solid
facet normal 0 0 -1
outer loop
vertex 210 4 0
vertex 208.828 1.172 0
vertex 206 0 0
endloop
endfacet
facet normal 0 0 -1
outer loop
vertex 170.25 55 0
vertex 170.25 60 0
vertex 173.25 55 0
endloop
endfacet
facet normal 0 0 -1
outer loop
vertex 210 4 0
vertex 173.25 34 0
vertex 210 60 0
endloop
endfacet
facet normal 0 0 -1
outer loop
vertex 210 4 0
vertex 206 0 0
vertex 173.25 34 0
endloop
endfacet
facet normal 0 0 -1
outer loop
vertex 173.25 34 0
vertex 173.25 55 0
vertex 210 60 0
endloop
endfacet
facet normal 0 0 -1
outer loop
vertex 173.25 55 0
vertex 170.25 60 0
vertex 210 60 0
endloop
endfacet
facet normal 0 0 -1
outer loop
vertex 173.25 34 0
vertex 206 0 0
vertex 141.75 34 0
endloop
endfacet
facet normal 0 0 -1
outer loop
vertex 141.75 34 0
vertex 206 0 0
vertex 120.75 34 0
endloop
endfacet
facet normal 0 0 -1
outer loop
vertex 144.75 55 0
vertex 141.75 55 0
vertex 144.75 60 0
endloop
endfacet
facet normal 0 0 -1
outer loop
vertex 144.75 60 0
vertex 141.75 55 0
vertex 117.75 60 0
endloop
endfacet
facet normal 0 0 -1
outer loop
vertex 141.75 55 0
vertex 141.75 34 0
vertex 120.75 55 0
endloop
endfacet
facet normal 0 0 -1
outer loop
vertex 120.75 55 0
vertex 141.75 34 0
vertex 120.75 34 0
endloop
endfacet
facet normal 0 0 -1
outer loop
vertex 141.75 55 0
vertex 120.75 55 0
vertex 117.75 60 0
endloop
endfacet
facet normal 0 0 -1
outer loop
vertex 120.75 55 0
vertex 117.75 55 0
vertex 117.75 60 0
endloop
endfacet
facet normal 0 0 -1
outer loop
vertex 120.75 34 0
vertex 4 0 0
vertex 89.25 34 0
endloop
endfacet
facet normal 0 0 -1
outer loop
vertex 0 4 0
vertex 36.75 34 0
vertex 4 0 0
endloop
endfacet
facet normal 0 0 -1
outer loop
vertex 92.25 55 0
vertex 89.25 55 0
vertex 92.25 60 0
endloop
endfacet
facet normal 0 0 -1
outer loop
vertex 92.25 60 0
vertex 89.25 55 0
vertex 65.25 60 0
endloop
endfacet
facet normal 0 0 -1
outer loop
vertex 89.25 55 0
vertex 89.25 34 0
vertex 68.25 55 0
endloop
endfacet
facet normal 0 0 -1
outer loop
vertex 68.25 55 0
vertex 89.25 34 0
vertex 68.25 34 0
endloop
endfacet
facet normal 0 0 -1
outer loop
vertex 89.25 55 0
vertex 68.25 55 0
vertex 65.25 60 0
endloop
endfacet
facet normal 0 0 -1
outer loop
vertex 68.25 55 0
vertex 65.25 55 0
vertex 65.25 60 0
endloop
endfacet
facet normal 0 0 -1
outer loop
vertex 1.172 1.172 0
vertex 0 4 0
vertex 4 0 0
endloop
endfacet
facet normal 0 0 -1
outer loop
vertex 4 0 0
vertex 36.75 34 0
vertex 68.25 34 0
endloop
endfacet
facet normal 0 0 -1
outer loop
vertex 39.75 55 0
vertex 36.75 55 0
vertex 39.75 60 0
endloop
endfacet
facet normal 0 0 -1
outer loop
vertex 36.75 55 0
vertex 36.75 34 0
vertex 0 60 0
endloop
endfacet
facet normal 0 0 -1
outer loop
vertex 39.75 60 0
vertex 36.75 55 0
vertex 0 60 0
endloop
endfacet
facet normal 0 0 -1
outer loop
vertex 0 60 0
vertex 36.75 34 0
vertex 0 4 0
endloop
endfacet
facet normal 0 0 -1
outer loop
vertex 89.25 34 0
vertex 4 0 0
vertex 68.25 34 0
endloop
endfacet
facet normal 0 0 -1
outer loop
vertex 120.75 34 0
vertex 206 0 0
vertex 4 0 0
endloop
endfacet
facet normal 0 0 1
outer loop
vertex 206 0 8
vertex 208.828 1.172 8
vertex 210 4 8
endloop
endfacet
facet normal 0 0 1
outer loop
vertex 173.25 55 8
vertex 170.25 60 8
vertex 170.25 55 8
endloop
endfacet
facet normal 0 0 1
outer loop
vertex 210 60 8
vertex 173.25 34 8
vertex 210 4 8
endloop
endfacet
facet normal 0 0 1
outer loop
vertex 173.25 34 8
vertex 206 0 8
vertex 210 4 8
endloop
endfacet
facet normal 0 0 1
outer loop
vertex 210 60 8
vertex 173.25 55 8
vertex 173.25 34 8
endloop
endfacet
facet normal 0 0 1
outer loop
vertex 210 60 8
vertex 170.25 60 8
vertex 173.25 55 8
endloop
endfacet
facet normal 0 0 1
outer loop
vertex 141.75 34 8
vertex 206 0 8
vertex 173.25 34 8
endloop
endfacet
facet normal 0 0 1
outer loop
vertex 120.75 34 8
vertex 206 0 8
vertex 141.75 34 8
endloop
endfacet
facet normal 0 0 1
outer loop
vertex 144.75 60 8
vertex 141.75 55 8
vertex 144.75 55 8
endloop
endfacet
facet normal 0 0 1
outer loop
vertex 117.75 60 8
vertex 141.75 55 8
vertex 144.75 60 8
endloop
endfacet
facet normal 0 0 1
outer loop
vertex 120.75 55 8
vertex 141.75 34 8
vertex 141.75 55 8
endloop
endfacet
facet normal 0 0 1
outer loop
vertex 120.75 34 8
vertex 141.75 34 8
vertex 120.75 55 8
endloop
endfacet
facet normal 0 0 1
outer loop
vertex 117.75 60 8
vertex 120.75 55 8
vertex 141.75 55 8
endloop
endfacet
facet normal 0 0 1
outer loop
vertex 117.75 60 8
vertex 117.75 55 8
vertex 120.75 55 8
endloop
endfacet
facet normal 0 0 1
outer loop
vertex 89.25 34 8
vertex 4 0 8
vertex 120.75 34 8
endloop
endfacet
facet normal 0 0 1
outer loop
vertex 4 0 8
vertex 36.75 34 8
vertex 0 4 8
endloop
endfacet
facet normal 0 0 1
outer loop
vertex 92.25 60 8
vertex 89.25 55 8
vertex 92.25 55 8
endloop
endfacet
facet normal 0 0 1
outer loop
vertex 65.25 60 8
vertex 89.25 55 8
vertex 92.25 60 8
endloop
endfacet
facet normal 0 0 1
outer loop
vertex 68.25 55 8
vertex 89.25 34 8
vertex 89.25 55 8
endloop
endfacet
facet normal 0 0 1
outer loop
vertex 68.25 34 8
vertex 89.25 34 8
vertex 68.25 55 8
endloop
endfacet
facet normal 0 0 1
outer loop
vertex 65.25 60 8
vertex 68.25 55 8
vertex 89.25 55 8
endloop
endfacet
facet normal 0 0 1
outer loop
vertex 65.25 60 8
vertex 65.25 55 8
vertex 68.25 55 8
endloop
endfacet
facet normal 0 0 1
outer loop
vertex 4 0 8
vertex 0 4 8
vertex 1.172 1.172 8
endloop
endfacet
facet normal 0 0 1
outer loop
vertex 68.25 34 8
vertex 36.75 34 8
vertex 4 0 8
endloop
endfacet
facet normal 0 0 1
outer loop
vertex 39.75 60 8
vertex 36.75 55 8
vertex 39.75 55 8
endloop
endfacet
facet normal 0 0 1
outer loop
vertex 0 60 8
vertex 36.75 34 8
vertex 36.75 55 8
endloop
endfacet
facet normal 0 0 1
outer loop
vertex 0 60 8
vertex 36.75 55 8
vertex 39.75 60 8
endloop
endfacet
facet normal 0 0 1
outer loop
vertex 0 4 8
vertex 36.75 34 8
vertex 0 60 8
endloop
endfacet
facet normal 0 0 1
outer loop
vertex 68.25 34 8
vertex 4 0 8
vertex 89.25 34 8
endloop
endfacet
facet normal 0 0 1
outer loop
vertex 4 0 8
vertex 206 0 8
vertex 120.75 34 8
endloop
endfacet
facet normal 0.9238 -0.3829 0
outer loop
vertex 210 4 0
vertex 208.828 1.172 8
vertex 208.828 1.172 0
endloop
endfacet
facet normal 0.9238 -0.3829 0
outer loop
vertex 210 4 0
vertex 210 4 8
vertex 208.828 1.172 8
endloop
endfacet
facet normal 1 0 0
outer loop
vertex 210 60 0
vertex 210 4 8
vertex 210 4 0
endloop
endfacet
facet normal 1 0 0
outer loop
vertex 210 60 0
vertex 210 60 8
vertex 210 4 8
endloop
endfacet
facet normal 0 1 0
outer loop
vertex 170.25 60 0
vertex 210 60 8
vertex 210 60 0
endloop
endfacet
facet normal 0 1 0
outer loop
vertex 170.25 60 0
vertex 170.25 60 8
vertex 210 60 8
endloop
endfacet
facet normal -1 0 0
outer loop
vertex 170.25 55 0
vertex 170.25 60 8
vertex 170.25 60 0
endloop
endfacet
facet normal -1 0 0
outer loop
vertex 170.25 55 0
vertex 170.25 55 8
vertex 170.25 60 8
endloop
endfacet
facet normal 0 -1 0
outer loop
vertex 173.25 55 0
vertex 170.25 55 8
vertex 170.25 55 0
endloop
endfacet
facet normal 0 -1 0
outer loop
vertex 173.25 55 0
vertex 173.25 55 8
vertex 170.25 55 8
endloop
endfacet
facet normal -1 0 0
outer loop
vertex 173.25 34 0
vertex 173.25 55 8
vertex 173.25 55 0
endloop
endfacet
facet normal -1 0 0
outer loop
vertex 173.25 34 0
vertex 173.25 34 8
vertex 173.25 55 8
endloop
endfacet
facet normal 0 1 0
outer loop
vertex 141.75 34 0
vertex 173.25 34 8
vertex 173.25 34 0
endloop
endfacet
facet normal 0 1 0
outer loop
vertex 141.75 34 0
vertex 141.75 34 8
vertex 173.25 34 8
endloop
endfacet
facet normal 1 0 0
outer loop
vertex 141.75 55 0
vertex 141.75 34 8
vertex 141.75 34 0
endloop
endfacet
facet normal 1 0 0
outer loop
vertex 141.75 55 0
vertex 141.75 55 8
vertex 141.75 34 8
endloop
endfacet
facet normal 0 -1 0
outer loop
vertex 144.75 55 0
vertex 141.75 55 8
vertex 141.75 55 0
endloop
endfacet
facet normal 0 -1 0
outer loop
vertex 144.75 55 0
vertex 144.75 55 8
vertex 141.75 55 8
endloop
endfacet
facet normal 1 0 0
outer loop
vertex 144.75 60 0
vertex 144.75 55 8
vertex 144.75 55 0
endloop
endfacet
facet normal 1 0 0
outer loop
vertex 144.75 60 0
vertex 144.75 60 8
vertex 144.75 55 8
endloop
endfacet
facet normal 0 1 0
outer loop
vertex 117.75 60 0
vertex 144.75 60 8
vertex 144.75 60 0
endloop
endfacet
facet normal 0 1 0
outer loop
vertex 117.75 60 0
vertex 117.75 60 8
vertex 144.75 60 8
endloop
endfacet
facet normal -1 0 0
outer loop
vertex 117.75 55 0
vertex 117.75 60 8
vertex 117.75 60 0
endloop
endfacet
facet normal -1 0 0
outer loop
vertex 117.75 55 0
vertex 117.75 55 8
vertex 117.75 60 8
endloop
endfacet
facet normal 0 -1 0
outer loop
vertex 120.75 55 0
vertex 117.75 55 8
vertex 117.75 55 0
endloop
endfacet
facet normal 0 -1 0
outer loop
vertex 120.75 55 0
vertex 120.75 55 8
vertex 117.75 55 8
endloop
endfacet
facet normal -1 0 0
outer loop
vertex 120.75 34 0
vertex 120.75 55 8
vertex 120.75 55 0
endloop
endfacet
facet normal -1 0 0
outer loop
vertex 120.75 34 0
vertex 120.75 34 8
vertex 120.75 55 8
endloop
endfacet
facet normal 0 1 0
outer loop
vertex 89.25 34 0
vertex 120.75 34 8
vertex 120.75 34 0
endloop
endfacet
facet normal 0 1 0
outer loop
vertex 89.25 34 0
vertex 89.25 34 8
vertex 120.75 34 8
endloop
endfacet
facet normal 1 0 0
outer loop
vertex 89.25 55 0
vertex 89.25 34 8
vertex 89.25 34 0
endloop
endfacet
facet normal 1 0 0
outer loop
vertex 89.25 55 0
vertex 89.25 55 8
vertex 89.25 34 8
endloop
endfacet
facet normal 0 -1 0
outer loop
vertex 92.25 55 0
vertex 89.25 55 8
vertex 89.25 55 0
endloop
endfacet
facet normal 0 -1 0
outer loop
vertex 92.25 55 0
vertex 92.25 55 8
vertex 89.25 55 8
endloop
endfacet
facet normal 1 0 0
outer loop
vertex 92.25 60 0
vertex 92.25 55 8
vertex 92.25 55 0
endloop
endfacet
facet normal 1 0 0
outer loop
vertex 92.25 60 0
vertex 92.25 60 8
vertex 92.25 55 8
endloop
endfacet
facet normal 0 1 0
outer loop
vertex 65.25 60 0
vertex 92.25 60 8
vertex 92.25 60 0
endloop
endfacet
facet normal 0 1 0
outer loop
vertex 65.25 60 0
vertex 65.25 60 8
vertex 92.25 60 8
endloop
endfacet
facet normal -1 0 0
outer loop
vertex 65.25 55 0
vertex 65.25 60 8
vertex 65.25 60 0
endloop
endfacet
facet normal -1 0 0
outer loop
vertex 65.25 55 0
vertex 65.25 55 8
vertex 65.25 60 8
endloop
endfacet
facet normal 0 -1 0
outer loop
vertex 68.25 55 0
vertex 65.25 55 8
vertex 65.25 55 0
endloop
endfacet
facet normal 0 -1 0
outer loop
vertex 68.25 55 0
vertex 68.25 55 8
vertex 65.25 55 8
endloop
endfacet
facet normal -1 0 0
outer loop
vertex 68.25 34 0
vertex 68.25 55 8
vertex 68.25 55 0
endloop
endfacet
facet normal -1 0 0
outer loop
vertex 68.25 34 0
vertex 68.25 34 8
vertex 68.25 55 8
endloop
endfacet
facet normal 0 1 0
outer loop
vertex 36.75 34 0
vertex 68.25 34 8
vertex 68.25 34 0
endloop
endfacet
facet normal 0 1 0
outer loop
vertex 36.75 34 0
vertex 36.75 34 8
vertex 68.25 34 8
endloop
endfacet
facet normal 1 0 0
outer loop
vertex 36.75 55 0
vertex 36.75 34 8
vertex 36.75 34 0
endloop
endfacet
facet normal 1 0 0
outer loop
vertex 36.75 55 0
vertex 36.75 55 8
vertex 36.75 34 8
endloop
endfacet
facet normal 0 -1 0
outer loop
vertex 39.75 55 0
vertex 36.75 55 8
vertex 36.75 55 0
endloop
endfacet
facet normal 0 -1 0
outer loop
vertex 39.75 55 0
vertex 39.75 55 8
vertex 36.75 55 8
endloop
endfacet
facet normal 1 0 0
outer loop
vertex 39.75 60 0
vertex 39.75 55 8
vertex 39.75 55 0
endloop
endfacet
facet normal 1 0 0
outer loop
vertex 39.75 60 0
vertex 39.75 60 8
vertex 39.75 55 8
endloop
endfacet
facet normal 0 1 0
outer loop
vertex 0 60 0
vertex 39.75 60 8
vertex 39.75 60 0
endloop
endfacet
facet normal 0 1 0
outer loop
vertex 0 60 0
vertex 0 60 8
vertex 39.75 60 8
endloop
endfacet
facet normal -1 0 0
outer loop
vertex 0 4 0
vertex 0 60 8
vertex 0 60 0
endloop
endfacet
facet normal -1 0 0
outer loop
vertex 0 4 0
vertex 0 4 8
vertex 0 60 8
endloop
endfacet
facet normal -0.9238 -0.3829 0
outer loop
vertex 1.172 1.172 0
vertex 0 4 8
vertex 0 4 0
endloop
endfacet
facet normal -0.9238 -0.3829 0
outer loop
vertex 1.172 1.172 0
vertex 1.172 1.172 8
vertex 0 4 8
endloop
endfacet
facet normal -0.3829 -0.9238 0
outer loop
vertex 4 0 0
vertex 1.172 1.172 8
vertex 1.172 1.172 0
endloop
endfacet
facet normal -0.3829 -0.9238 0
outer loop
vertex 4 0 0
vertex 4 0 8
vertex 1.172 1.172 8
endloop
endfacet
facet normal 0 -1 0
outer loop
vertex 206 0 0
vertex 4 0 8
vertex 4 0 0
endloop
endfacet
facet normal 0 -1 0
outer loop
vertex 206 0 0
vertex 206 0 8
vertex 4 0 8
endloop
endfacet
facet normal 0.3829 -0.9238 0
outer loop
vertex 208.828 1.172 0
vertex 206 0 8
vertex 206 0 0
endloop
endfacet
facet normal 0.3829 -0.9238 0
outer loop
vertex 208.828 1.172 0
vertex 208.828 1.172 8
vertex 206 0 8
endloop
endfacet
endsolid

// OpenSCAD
$fn = 32;

// ----------------------------------------------------------------------
// Oversize slot bar: 210 mm bar with 3 oversize windows
// ----------------------------------------------------------------------

// --- parameters (mm) ---
profile_height = 8;       // extrusion height
profile_points = 32;      // points of the closed outline

profile = [[0, 4], [1.172, 1.172], [4, 0], [206, 0], [208.828, 1.172], [210, 4], [210, 60], [170.25, 60], [170.25, 55], [173.25, 55], [173.25, 34], [141.75, 34], [141.75, 55], [144.75, 55], [144.75, 60], [117.75, 60], [117.75, 55], [120.75, 55], [120.75, 34], [89.25, 34], [89.25, 55], [92.25, 55], [92.25, 60], [65.25, 60], [65.25, 55], [68.25, 55], [68.25, 34], [36.75, 34], [36.75, 55], [39.75, 55], [39.75, 60], [0, 60]];  // single closed polygon, 32 points, counter clockwise

// --- the one profile operation ---
linear_extrude(height = profile_height) polygon(points = profile);
